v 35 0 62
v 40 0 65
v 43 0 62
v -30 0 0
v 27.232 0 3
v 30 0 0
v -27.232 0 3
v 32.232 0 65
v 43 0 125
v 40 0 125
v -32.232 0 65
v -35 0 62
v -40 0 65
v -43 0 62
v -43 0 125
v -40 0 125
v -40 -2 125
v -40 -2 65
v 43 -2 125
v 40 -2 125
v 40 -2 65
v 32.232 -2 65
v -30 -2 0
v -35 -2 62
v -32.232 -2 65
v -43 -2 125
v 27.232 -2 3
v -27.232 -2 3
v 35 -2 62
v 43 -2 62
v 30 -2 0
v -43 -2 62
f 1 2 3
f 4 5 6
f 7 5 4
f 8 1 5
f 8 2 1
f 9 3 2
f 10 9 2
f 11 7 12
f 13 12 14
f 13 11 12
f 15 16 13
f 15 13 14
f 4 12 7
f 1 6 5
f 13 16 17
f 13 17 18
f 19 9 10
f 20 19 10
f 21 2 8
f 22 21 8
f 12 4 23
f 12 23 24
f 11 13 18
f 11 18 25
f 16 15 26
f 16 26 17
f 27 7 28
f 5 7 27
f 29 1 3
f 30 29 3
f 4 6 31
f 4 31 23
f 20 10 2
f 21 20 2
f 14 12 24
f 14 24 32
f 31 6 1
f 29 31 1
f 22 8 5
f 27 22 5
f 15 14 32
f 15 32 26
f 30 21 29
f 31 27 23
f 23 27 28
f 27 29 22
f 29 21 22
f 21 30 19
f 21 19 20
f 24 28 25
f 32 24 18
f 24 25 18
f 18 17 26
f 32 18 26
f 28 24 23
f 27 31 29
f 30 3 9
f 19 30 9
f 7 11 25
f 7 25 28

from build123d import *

# Parameters (mm, degrees)
F1_DEPTH = 2


with BuildPart() as f1:
    # F0 (on Front) → F1 (new body)
    with BuildSketch(Plane.XZ):
        Polygon((0, 3), (0, 0), (30, 0), (35, 62), (43, 62), (43, 125), (40, 125), (40, 65), (32.232196, 65), (27.232196, 3), align=None)
    extrude(amount=F1_DEPTH)

    # F2: F1 across plane


with BuildPart() as f1_1:
    add(f1.part)
    add(f1.part.mirror(Plane.YZ))


solid = f1_1.part
